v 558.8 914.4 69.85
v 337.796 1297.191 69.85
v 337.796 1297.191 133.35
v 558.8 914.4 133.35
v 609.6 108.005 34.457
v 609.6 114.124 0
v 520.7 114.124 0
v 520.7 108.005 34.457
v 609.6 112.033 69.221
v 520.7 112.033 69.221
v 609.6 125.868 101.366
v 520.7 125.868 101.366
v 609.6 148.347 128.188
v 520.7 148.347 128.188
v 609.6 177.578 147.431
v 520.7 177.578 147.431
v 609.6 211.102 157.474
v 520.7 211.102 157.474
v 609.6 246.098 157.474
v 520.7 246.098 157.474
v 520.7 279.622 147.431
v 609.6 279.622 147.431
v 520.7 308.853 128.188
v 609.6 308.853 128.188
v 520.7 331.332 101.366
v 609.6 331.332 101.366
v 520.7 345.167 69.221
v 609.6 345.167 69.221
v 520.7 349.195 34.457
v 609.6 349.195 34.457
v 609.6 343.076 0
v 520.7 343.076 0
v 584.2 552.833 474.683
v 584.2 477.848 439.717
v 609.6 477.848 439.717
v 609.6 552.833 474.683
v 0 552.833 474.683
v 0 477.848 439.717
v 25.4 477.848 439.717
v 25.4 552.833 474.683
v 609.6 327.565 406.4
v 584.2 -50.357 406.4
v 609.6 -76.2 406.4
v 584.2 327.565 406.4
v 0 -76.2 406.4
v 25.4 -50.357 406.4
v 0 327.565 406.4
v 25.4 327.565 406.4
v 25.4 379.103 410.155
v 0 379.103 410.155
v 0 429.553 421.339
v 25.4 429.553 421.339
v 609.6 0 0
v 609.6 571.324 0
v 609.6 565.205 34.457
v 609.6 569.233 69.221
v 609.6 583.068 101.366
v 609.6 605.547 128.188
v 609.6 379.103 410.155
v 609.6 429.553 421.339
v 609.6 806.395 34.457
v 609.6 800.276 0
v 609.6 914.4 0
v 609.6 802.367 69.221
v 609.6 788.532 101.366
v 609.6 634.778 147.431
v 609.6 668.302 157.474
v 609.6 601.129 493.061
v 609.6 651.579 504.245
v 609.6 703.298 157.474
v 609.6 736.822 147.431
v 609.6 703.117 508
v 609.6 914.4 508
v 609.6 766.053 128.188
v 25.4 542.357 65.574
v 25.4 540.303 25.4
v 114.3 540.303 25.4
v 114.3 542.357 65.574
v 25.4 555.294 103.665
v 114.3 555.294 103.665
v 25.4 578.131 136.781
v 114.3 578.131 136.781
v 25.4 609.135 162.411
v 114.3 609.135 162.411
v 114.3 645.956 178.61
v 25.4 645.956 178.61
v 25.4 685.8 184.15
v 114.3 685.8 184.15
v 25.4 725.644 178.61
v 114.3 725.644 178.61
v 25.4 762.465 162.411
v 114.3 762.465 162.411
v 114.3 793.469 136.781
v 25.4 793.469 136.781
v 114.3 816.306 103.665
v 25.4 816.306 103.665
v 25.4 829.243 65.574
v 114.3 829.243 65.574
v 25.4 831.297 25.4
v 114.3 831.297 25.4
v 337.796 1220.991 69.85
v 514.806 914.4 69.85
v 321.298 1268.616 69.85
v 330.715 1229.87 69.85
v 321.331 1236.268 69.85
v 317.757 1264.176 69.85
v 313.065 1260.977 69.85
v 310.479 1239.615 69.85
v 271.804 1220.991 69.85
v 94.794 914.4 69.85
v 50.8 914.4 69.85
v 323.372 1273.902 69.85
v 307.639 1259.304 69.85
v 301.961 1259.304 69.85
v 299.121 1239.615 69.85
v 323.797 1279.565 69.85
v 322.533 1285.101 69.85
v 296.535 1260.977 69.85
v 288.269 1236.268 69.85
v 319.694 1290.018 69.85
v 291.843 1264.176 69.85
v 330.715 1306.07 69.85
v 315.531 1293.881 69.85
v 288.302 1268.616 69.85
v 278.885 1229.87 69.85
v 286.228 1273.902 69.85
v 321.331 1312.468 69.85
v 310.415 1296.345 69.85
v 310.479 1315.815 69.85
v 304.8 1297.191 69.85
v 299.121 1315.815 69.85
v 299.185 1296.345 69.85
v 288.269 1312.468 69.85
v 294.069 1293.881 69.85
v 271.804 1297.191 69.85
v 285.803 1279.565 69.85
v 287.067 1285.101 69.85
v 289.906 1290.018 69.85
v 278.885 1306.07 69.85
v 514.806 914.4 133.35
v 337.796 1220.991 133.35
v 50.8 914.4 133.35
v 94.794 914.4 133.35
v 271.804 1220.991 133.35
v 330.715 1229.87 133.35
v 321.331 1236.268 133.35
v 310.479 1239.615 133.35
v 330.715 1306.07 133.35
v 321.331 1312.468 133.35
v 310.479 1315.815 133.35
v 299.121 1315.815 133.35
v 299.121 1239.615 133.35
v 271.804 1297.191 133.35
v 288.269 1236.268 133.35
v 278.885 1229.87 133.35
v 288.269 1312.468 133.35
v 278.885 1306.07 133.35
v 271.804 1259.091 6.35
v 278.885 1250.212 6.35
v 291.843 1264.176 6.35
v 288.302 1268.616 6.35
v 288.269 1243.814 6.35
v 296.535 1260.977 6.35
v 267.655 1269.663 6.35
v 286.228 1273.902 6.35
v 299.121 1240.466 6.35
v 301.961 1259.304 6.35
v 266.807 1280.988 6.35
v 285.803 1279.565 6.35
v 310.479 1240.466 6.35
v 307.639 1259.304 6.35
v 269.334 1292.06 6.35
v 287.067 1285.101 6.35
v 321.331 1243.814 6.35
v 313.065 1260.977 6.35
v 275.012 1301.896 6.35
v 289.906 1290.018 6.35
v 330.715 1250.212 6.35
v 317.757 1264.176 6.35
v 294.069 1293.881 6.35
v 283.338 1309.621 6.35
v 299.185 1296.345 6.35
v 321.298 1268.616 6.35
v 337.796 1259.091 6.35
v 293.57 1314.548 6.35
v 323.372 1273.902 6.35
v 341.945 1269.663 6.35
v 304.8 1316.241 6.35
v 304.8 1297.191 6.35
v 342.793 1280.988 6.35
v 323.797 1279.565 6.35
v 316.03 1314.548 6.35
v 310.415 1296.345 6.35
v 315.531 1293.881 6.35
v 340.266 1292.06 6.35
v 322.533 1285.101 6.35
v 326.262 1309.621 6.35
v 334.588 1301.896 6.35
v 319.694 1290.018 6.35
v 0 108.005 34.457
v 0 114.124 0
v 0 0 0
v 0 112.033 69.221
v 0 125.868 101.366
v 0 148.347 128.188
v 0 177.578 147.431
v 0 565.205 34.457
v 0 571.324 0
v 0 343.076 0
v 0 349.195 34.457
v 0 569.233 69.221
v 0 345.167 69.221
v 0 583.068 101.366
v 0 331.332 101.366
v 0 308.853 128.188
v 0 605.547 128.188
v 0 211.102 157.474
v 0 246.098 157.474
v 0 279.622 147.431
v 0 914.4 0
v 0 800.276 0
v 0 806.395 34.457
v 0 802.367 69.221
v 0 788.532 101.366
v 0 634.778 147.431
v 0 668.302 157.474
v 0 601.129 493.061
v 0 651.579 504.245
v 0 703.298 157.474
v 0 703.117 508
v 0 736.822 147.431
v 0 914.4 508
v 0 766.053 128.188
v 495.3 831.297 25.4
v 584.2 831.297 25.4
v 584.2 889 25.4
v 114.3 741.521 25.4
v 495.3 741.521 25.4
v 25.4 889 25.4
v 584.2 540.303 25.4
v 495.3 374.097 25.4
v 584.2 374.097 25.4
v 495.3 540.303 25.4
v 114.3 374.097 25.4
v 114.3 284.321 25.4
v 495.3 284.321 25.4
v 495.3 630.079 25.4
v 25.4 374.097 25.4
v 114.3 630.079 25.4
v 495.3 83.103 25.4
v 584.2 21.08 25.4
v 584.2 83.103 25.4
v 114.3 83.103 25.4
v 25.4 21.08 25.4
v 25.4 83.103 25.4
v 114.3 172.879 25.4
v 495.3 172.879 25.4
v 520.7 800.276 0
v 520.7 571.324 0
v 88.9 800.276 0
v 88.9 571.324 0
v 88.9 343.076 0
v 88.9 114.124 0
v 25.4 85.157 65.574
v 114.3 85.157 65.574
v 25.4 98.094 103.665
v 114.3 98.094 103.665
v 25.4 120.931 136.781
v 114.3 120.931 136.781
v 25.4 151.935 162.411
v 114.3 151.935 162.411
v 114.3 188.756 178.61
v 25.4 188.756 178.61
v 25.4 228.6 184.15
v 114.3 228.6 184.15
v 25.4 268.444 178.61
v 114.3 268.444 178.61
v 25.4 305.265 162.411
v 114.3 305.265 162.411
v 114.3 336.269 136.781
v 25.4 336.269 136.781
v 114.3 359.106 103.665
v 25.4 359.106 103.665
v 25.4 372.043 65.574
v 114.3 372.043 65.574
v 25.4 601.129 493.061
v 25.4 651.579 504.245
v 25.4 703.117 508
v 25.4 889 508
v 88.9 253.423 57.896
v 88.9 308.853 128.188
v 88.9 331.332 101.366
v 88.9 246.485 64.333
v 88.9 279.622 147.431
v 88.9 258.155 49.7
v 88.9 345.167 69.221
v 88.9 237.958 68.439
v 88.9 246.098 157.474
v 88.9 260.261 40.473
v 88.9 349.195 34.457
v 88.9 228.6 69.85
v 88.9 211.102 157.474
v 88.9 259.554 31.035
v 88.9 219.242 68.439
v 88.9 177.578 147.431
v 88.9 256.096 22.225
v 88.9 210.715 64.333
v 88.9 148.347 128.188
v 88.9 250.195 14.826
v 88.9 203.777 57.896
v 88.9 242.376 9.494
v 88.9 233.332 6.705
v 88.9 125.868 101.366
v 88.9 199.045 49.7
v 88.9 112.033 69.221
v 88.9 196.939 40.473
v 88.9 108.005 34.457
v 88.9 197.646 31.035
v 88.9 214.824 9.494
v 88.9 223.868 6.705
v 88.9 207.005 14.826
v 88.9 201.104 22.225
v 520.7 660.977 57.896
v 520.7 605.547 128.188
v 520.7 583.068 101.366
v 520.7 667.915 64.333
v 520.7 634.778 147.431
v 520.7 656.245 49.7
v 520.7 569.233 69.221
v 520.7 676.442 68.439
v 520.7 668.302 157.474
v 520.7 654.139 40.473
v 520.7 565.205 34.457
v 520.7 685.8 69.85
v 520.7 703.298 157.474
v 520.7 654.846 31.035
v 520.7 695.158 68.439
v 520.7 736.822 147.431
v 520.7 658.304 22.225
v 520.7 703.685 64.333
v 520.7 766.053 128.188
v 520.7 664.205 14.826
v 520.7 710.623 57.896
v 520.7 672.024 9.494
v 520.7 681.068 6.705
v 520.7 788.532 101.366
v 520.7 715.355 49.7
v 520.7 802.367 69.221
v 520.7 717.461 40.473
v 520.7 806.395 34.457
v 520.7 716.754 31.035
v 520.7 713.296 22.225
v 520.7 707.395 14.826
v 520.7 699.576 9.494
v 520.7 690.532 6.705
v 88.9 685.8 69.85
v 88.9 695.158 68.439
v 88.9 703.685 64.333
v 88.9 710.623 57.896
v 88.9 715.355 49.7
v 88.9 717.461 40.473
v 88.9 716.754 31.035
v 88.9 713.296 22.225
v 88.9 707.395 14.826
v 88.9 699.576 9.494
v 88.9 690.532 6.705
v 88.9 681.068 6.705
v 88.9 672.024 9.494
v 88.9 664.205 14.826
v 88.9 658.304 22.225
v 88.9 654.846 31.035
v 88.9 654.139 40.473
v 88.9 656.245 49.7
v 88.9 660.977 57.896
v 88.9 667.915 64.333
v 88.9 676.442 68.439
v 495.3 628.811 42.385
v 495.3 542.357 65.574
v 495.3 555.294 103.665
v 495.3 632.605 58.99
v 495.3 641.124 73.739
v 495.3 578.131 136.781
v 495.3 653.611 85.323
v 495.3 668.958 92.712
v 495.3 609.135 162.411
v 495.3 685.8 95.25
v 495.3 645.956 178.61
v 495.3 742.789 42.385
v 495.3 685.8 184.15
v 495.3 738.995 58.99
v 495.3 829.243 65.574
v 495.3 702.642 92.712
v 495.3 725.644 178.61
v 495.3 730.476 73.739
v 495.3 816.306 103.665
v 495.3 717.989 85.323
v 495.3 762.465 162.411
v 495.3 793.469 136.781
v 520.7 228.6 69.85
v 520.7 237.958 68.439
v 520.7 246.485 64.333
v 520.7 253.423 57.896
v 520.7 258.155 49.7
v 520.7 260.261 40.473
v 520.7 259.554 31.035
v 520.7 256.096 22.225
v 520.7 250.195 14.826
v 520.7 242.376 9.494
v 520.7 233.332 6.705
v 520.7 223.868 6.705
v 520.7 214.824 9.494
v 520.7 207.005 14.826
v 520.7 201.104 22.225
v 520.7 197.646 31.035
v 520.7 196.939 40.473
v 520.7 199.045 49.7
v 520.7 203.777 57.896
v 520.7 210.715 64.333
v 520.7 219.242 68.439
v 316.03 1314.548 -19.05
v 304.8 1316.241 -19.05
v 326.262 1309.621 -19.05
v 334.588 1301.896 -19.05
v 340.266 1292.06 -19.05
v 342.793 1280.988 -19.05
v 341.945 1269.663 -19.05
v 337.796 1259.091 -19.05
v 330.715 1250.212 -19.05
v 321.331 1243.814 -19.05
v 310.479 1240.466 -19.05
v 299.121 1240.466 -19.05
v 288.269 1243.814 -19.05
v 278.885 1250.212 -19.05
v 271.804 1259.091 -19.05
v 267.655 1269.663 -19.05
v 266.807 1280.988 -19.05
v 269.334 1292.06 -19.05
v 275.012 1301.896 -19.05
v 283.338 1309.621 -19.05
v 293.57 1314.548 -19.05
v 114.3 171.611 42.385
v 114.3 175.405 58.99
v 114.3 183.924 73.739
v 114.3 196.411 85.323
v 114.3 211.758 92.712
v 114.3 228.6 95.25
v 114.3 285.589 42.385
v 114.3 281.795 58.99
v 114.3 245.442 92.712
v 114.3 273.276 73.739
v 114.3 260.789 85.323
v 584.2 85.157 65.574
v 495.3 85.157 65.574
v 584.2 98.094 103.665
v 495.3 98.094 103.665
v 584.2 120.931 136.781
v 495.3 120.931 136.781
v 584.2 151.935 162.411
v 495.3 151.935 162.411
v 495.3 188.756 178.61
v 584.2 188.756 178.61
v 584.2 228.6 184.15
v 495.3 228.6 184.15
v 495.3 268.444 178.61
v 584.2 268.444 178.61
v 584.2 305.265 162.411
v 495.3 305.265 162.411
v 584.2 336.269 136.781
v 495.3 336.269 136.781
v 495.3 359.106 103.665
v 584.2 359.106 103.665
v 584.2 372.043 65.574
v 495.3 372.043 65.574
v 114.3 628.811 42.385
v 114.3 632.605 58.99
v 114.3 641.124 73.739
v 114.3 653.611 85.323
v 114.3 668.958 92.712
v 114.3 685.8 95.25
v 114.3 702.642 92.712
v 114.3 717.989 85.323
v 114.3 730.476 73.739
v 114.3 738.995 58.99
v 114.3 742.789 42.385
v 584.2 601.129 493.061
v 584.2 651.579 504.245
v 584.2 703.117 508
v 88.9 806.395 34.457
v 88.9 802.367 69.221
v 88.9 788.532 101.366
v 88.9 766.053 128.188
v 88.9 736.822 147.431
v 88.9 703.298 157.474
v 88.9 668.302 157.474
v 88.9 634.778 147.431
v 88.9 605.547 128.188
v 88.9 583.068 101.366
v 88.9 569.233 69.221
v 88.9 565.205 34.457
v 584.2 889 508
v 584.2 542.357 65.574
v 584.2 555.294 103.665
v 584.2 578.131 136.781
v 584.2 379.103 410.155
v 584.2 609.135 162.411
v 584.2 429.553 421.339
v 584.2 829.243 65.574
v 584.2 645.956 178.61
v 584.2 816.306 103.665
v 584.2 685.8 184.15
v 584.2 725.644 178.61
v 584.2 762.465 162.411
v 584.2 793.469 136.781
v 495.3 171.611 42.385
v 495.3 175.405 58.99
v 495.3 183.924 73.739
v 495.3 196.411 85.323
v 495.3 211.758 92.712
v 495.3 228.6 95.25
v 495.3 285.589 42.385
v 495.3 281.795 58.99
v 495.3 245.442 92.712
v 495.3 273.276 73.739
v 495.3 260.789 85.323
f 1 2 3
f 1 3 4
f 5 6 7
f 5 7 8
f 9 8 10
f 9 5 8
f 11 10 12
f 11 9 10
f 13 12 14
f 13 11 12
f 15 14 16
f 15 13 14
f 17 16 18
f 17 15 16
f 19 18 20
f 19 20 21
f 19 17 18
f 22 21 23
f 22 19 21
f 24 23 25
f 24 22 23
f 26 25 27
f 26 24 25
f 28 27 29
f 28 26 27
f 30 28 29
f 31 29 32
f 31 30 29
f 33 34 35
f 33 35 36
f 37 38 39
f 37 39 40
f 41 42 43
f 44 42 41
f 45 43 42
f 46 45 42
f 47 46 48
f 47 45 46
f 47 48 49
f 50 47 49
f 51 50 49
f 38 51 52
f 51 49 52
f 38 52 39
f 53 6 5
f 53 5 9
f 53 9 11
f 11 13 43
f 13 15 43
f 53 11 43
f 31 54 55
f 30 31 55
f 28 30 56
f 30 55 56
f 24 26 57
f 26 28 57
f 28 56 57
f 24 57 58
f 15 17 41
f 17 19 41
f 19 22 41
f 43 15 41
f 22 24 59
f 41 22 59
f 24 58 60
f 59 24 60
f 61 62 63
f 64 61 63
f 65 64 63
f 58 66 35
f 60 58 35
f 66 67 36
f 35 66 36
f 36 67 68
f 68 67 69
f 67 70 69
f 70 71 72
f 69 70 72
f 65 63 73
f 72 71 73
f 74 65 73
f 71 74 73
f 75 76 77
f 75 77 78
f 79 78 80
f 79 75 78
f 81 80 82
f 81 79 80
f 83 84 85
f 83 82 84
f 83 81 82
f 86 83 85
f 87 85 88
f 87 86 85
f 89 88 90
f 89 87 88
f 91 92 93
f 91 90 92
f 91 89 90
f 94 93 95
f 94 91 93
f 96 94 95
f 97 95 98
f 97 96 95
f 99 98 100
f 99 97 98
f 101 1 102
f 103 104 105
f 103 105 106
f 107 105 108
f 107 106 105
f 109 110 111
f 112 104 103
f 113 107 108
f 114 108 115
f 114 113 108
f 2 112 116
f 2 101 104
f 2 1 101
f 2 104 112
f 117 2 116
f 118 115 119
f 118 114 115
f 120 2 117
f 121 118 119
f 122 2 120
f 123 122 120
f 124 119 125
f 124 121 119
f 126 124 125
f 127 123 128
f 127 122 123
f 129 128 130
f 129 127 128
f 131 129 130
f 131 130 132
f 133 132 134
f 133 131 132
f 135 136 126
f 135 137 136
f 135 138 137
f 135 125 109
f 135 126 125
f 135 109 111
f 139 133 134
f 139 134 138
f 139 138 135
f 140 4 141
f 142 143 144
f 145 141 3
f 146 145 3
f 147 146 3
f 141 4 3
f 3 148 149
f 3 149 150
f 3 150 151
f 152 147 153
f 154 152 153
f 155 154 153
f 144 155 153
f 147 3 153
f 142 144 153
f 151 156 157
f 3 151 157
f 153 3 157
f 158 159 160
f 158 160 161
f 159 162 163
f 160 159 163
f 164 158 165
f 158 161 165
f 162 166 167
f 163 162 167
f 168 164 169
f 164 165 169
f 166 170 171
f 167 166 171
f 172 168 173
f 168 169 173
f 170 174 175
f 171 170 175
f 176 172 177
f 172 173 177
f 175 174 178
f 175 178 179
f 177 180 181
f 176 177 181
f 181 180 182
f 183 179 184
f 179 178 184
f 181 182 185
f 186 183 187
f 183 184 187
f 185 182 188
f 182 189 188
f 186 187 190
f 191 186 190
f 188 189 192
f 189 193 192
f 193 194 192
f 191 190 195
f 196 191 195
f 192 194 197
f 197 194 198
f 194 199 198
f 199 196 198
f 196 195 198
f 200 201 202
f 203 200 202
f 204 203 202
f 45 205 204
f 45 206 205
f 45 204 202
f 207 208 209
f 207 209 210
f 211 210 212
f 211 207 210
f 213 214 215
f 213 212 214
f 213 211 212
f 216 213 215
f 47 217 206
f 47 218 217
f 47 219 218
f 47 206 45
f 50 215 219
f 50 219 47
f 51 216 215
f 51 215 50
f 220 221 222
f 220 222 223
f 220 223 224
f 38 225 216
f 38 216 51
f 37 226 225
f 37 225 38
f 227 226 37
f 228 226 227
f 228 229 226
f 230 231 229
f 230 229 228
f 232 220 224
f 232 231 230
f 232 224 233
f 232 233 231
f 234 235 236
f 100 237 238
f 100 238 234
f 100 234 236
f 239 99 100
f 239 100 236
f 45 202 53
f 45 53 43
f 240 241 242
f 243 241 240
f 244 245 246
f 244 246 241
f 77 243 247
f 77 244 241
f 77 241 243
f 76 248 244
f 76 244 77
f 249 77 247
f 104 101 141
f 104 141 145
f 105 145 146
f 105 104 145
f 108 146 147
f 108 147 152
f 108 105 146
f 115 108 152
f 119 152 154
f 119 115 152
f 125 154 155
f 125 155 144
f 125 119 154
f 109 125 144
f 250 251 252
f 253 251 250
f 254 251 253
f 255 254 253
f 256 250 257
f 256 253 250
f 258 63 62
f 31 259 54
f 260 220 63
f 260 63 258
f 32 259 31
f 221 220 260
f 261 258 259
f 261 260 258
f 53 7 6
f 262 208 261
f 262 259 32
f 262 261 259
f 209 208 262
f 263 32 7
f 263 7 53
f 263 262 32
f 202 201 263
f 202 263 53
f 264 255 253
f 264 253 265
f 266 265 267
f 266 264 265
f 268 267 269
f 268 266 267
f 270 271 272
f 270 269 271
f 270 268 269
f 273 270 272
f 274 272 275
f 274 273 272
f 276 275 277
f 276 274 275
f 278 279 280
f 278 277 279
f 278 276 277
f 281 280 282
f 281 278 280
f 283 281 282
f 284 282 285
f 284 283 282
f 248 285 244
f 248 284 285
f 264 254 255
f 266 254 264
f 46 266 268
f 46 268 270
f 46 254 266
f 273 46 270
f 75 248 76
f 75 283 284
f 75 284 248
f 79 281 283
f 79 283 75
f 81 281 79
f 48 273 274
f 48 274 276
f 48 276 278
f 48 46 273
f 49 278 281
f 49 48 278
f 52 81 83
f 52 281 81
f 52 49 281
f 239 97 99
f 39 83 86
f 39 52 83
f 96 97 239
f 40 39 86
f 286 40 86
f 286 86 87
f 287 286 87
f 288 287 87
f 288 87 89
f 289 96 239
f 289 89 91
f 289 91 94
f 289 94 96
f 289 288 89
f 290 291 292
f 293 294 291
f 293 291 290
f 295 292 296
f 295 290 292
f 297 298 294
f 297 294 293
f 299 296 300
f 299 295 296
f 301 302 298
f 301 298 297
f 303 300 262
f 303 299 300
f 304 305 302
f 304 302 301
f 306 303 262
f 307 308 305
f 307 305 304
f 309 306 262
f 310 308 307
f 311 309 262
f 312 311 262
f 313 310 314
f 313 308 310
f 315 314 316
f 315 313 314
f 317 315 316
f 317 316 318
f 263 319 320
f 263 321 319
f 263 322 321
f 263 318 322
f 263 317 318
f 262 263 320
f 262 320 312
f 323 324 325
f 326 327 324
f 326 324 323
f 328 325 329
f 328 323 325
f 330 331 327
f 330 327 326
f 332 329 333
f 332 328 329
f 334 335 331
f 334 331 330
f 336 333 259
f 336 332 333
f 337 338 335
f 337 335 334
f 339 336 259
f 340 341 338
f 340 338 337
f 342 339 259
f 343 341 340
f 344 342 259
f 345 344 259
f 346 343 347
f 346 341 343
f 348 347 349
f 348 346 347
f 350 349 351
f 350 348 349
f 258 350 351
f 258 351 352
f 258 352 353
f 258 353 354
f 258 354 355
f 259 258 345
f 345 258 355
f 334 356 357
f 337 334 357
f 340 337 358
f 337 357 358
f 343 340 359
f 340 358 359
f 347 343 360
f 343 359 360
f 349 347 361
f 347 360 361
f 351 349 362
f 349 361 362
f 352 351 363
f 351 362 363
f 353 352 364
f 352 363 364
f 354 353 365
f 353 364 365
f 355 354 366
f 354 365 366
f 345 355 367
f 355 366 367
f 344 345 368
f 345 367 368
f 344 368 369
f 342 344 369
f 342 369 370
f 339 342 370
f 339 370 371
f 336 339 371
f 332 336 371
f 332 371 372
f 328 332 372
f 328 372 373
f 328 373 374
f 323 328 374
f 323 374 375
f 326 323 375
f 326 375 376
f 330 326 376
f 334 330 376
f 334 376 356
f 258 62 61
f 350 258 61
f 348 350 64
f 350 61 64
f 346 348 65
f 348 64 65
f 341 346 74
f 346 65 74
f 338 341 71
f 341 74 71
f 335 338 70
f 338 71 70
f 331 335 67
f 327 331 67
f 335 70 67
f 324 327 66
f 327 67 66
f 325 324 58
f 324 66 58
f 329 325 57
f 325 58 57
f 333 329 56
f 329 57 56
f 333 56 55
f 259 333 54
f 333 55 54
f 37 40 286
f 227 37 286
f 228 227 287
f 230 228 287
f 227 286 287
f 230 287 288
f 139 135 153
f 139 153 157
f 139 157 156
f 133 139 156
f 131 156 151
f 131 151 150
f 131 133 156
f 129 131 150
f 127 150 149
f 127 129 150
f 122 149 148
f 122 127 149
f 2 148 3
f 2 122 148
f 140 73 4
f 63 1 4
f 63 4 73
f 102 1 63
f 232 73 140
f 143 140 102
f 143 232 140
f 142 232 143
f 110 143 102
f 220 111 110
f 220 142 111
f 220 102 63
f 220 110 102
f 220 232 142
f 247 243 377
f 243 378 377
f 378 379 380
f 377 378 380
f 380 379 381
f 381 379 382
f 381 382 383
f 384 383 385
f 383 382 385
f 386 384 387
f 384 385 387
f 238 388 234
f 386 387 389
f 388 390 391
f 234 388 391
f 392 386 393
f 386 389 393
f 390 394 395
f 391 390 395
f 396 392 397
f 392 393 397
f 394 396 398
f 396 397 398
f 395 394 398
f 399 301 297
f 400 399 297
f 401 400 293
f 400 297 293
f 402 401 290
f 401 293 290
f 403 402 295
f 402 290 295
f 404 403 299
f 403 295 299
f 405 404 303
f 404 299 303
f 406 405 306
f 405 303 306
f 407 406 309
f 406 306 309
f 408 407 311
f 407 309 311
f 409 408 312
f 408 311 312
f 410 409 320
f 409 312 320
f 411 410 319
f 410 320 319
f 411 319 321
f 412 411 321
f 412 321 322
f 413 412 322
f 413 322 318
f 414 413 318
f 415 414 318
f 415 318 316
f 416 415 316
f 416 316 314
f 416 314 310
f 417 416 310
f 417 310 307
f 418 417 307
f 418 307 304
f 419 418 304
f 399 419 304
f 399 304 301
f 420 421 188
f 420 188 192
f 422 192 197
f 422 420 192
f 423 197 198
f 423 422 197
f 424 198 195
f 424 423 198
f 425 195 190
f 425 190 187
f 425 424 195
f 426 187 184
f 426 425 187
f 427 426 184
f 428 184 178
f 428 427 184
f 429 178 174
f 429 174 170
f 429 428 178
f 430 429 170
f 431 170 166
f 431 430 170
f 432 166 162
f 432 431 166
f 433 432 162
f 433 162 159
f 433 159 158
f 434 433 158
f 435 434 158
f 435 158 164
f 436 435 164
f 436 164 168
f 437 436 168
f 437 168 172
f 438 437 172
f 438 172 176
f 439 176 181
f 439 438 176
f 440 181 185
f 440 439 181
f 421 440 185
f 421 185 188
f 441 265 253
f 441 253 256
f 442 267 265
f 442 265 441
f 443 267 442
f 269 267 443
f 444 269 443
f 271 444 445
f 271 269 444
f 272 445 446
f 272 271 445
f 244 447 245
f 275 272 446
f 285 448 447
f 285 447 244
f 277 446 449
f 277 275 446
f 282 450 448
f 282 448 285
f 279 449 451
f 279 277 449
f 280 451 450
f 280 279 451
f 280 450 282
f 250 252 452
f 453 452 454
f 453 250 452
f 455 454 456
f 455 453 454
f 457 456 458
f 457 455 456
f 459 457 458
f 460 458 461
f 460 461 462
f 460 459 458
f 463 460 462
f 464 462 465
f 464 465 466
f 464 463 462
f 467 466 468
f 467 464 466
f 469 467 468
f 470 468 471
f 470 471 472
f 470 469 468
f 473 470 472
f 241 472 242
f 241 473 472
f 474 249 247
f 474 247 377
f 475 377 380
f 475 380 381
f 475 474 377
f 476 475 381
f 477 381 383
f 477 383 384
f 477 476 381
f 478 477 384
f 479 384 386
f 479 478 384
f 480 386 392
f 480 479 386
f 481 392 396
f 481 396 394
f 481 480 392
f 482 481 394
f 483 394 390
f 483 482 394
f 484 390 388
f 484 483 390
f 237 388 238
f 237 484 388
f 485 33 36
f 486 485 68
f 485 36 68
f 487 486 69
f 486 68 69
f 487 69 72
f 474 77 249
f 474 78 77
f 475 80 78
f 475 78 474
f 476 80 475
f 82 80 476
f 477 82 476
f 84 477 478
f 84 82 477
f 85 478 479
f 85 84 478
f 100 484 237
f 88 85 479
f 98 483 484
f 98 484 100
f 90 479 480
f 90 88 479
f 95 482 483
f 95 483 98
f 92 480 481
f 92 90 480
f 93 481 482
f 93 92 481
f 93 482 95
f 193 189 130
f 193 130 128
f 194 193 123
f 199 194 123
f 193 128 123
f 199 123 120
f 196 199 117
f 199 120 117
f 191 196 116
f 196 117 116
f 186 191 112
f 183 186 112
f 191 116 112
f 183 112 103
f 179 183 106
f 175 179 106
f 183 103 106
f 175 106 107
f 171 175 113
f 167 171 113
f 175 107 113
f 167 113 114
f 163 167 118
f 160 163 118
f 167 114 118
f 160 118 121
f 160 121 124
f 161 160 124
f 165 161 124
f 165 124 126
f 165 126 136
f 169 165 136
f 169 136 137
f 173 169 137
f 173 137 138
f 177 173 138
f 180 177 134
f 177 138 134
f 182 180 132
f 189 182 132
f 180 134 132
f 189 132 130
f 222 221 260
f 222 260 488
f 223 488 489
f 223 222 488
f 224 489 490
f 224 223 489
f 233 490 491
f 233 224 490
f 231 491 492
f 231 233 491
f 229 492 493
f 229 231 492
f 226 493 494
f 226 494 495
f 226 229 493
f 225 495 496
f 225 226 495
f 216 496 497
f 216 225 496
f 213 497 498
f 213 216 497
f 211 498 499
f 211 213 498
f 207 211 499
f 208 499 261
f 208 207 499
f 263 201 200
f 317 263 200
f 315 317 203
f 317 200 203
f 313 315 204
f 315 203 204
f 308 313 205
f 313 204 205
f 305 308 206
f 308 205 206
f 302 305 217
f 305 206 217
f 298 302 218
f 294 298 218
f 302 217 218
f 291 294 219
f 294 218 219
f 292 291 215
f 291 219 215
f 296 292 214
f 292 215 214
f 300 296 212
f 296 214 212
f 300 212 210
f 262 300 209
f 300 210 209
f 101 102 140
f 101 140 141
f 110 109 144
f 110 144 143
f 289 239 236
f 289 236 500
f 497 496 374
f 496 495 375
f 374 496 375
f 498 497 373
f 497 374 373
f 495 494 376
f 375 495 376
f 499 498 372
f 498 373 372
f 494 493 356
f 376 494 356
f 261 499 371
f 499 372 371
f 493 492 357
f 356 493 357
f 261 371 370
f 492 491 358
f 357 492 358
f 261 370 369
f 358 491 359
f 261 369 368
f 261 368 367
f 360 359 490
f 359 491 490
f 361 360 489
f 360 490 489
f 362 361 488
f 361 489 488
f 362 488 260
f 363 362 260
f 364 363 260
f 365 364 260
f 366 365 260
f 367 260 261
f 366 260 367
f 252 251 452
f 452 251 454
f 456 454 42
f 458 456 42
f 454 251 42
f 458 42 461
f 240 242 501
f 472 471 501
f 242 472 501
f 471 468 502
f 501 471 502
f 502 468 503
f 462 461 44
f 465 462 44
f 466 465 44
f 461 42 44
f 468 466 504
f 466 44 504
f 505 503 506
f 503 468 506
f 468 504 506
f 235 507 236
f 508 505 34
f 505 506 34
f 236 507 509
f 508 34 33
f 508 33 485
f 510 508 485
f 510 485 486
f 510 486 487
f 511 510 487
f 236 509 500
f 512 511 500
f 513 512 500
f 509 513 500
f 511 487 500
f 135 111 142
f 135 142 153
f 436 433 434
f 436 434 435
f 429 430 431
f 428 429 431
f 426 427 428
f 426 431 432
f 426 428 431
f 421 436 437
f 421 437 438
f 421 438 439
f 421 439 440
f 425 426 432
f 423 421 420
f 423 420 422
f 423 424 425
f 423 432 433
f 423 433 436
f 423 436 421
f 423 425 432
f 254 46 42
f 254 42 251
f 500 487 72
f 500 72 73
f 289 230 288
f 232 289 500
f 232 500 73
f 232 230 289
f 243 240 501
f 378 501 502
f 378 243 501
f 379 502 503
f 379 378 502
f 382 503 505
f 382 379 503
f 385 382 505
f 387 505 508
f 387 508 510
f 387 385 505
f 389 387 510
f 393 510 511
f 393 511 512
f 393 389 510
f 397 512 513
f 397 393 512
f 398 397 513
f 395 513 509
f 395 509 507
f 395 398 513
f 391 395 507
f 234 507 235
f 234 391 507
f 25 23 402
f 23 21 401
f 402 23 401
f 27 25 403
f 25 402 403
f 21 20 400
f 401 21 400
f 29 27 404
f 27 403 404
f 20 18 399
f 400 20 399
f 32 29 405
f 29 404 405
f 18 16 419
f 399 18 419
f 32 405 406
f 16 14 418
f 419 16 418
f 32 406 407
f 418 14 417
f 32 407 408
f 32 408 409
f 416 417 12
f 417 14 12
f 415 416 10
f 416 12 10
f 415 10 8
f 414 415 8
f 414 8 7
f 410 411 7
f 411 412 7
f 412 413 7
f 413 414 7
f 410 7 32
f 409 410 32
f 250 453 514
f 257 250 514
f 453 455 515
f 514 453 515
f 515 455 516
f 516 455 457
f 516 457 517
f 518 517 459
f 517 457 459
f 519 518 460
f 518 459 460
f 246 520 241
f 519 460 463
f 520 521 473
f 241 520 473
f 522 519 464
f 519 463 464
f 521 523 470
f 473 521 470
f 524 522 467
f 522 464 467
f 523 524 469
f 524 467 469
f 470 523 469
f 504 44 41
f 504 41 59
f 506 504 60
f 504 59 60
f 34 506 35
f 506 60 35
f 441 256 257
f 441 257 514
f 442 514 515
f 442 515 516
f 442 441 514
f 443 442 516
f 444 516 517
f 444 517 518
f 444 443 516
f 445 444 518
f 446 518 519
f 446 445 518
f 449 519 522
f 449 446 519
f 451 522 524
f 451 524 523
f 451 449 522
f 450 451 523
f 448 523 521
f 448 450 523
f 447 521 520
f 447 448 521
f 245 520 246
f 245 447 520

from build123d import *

# Parameters (mm, degrees)
BOSS_EXTRUDE1_DEPTH                        = 609.6
FILLET1_R                                  = 355.6
SKETCH2_R                                  = 31.75
CUT_EXTRUDE1_DEPTH                         = 609.6
SKETCH4_R                                  = 120.65
CUT_EXTRUDE2_DEPTH                         = 88.9
MIRROR1_AT_THE_SECOND_PLANE_COPY_1_SKETC_R = 120.65
MIRROR1_AT_THE_SECOND_PLANE_COPY_1_DEPTH   = 88.9
SHELL1_START                               = 25.4
SHELL1_DEPTH                               = 558.8
SHELL1_START_2                             = 114.3
SHELL1_2_DEPTH                             = 381
BOSS_EXTRUDE6_START                        = -69.85
BOSS_EXTRUDE6_DEPTH                        = 63.5
SKETCH8_R                                  = 19.05
BOSS_EXTRUDE7_DEPTH                        = 63.5
BOSS_EXTRUDE8_START                        = 25.4
SKETCH9_R                                  = 38.1
BOSS_EXTRUDE8_DEPTH                        = 25.4


# Read off the part's stored shape, not the designer's step: Shell1
with BuildPart() as part:
    # Sketch1 → Boss-Extrude1 (new body)
    with BuildSketch(Plane(origin=(0, 0, 0), x_dir=(0, 0, -1), z_dir=(1, 0, 0))):
        Polygon((0, 0), (-406.4, -76.2), (-406.4, 406.4), (-508, 624.281903124), (-508, 914.4), (0, 914.4), align=None)
    extrude(amount=BOSS_EXTRUDE1_DEPTH)

    # Fillet1
    fillet1_edges = [part.edges().sort_by_distance(p)[0] for p in [
        (304.8, 406.4, 406.4),
        (304.8, 624.281903124, 508),
    ]]
    fillet(fillet1_edges, radius=FILLET1_R)

    # Sketch2 → Cut-Extrude1 (cut)
    with BuildSketch(Plane.ZY):
        with Locations((38.1, 228.6)):
            Circle(SKETCH2_R)
        with Locations((38.1, 685.8)):
            Circle(SKETCH2_R)
    extrude(amount=-CUT_EXTRUDE1_DEPTH, mode=Mode.SUBTRACT)

    # Sketch4 → Cut-Extrude2 (cut)
    with BuildSketch(Plane(origin=(609.6, 0, 0), x_dir=(0, 0, -1), z_dir=(1, 0, 0))):
        with Locations((-38.1, 685.8)):
            Circle(SKETCH4_R)
    cut_extrude2 = extrude(amount=-CUT_EXTRUDE2_DEPTH, mode=Mode.SUBTRACT)

    # Mirror1: Cut-Extrude2 across plane
    add(cut_extrude2.mirror(Plane(origin=(304.8, 0, 0), x_dir=(0, 0, 1), z_dir=(1, 0, 0))), mode=Mode.SUBTRACT)

    # Mirror1 at the second plane: Cut-Extrude2 across plane
    add(cut_extrude2.mirror(Plane.ZX.offset(457.2)), mode=Mode.SUBTRACT)

    # Mirror1 at the second plane copy 1 sketc → Mirror1 at the second plane copy 1 (cut)
    with BuildSketch(Plane(origin=(0, 914.4, 0), x_dir=(0, 0, -1), z_dir=(-1, 0, 0))):
        with Locations((-38.1, 685.8)):
            Circle(MIRROR1_AT_THE_SECOND_PLANE_COPY_1_SKETC_R)
    extrude(amount=-MIRROR1_AT_THE_SECOND_PLANE_COPY_1_DEPTH, mode=Mode.SUBTRACT)

    # Shell1 outline → Shell1 (cut)
    with BuildSketch(Plane.YZ.offset(SHELL1_START)):
        with BuildLine():
            Line((374.096778315, 25.4), (540.303221685, 25.4))
            ThreePointArc((540.303221685, 25.4), (685.8, 184.15), (831.296778315, 25.4))
            Line((831.296778315, 25.4), (889, 25.4))
            Line((889, 25.4), (889, 508))
            Line((889, 508), (703.11652516, 508))
            ThreePointArc((703.11652516, 508), (626.150598444, 499.570860132), (552.833471285, 474.68304907))
            Line((552.833471285, 474.68304907), (477.848431839, 439.71695093))
            ThreePointArc((477.848431839, 439.71695093), (404.53130468, 414.829139868), (327.565377964, 406.4))
            Line((327.565377964, 406.4), (-50.357372304, 406.4))
            Line((-50.357372304, 406.4), (21.080127696, 25.4))
            Line((21.080127696, 25.4), (83.103221685, 25.4))
            ThreePointArc((83.103221685, 25.4), (228.6, 184.15), (374.096778315, 25.4))
        make_face()
    extrude(amount=SHELL1_DEPTH, mode=Mode.SUBTRACT)

    # Shell1 2 outline → Shell1 2 (cut)
    with BuildSketch(Plane.YZ.offset(SHELL1_START_2)):
        with BuildLine():
            Line((540.303221685, 25.4), (630.07897614, 25.4))
            ThreePointArc((630.07897614, 25.4), (685.8, 95.25), (741.52102386, 25.4))
            Line((741.52102386, 25.4), (831.296778315, 25.4))
            ThreePointArc((831.296778315, 25.4), (685.8, 184.15), (540.303221685, 25.4))
        make_face()
        with BuildLine():
            Line((284.32102386, 25.4), (374.096778315, 25.4))
            ThreePointArc((374.096778315, 25.4), (228.6, 184.15), (83.103221685, 25.4))
            Line((83.103221685, 25.4), (172.87897614, 25.4))
            ThreePointArc((172.87897614, 25.4), (228.6, 95.25), (284.32102386, 25.4))
        make_face()
    extrude(amount=SHELL1_2_DEPTH, mode=Mode.SUBTRACT)

    # Sketch6 → Boss-Extrude6 (add)
    with BuildSketch(Plane(origin=(0, 0, 0), x_dir=(-1, 0, 0), z_dir=(0, 0, -1)).offset(BOSS_EXTRUDE6_START)):
        with BuildLine():
            Line((-558.8, 914.4), (-514.805909488, 914.4))
            Line((-514.805909488, 914.4), (-337.795567884, 1220.990905122))
            ThreePointArc((-337.795567884, 1220.990905122), (-304.8, 1240.040905122), (-271.804432116, 1220.990905122))
            Line((-271.804432116, 1220.990905122), (-94.794090512, 914.4))
            Line((-94.794090512, 914.4), (-50.8, 914.4))
            Line((-50.8, 914.4), (-271.804432116, 1297.190905122))
            ThreePointArc((-271.804432116, 1297.190905122), (-304.8, 1316.240905122), (-337.795567884, 1297.190905122))
            Line((-337.795567884, 1297.190905122), (-558.8, 914.4))
        make_face()
    extrude(amount=-BOSS_EXTRUDE6_DEPTH)

    # Sketch8 → Boss-Extrude7 (add)
    with BuildSketch(Plane(origin=(0, 0, 69.85), x_dir=(-1, 0, 0), z_dir=(0, 0, -1))):
        with Locations(Location((-304.8, 1278.140905122, 0), (0, 0, 90))):
            Circle(SKETCH8_R)
    extrude(amount=BOSS_EXTRUDE7_DEPTH)

    # Sketch9 → Boss-Extrude8 (add)
    with BuildSketch(Plane(origin=(0, 0, 6.35), x_dir=(-1, 0, 0), z_dir=(0, 0, -1)).offset(BOSS_EXTRUDE8_START)):
        with Locations(Location((-304.8, 1278.140905122, 0), (0, 0, 90))):
            Circle(SKETCH9_R)
    extrude(amount=-BOSS_EXTRUDE8_DEPTH)


solid = part.part
